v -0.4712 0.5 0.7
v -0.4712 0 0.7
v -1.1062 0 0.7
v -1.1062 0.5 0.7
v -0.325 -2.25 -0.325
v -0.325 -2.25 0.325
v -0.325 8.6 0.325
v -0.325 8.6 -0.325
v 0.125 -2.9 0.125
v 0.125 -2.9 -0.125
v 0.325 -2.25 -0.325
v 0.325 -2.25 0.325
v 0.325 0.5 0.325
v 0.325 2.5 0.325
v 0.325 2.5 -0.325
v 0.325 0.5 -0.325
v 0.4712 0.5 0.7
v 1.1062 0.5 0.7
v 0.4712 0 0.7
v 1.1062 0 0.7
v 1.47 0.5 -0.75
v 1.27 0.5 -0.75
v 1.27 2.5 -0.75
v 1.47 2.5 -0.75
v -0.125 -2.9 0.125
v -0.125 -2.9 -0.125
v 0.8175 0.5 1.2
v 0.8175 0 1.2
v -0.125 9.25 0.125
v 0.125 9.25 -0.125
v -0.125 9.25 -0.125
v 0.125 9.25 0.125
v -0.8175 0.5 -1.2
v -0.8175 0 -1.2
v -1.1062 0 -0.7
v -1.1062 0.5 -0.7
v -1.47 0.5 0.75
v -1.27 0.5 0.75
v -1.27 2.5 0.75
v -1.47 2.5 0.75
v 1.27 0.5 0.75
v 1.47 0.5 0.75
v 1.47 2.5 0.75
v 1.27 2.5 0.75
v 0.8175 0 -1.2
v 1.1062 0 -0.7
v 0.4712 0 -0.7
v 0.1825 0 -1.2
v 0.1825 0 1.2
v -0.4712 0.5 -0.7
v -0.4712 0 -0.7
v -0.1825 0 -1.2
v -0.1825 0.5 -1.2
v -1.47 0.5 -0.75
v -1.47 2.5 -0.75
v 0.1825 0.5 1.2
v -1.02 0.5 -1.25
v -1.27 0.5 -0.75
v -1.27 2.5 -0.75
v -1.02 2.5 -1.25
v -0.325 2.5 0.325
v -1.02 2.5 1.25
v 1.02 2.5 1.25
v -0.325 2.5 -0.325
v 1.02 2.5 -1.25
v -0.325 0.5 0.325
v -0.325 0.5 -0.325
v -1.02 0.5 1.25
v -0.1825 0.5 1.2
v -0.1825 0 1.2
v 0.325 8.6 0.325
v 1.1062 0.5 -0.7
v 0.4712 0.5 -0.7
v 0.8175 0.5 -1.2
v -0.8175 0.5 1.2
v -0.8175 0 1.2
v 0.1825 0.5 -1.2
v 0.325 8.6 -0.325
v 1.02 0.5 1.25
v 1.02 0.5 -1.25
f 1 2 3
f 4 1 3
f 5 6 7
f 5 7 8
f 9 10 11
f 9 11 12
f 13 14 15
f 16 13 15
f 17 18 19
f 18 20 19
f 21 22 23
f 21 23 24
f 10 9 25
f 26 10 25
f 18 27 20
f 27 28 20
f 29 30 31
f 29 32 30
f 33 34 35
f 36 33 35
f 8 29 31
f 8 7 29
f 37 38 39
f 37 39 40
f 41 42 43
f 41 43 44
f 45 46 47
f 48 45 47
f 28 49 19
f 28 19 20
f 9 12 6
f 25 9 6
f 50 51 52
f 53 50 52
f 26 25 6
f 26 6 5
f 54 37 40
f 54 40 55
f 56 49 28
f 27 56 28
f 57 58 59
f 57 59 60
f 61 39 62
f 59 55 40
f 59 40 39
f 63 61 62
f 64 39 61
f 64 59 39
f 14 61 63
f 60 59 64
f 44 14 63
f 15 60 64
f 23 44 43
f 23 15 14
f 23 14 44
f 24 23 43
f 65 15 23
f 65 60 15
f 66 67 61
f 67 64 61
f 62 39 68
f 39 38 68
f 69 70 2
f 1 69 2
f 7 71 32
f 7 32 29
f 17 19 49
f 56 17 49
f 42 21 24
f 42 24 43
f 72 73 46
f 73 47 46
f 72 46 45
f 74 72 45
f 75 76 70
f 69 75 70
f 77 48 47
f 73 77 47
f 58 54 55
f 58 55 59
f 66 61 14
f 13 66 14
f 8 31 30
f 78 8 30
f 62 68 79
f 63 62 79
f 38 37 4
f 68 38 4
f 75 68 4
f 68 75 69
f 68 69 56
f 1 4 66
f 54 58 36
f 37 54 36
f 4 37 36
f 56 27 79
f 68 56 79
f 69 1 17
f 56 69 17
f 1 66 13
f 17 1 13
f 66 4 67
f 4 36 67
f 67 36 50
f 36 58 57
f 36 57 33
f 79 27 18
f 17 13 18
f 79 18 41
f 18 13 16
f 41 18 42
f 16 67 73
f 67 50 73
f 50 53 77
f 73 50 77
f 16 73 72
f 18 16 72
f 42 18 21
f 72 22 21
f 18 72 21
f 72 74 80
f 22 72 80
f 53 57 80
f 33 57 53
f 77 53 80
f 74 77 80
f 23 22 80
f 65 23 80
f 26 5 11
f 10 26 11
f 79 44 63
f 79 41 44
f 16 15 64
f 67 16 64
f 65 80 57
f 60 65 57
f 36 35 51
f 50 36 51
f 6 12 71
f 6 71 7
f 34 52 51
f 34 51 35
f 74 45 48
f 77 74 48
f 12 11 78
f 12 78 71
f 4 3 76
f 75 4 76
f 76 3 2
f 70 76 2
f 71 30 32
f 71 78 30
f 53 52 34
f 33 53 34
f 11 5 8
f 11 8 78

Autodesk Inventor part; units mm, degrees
ref_plane "YZ Plane" through (0, 0, 0) normal (1, 0, 0) x (0, 1, 0)
ref_plane "XZ Plane" through (0, 0, 0) normal (0, 1, 0) x (-1, 0, 0)
ref_plane "XY Plane" through (0, 0, 0) normal (0, 0, 1) x (1, 0, 0)
sketch "Sketch1" plane through (0, 0, 0) normal (0, 1, 0) x (-1, 0, 0)
  line L0 (1.02, 1.25) -> (1.27, 0.75)
  line L1 (-1.02, 1.25) -> (1.02, 1.25)
  line L2 (-1.27, -0.75) -> (-1.27, 0.75)
  line L3 (-1.02, -1.25) -> (-1.27, -0.75)
  line L4 (1.02, -1.25) -> (-1.02, -1.25)
  line L5 (1.27, -0.75) -> (1.02, -1.25)
  line L6 (1.27, 0.75) -> (1.27, -0.75)
  line L7 (1.02, 1.25) -> (1.27, 0.75)
  line L8 (-1.02, 1.25) -> (1.02, 1.25)
  line L9 (-1.27, 0.75) -> (-1.02, 1.25)
  line L10 (0.815, 1.2) -> (0.18, 1.2)
  line L11 (1.1037, 0.7) -> (0.815, 1.2)
  line L12 (0.4687, 0.7) -> (1.1037, 0.7)
  line L13 (0.18, 1.2) -> (0.4687, 0.7)
  line L14 (-0.815, 1.2) -> (-1.1037, 0.7)
  line L15 (-0.18, 1.2) -> (-0.815, 1.2)
  line L16 (-0.4687, 0.7) -> (-0.18, 1.2)
  line L17 (-1.1037, 0.7) -> (-0.4687, 0.7)
  line L18 (0.815, -1.2) -> (1.1037, -0.7)
  line L19 (0.18, -1.2) -> (0.815, -1.2)
  line L20 (0.4687, -0.7) -> (0.18, -1.2)
  line L21 (1.1037, -0.7) -> (0.4687, -0.7)
  line L22 (-0.815, -1.2) -> (-0.18, -1.2)
  line L23 (-1.1037, -0.7) -> (-0.815, -1.2)
  line L24 (-0.4687, -0.7) -> (-1.1037, -0.7)
  line L25 (-0.18, -1.2) -> (-0.4687, -0.7)
  line L26 (-0.325, 0.325) -> (0.325, 0.325)
  line L27 (0.325, 0.325) -> (0.325, -0.325)
  line L28 (-0.325, -0.325) -> (0.325, -0.325)
  line L29 (-0.325, 0.325) -> (-0.325, -0.325)
  point P0 (0, 0)
  point P1 (0, 0)
sketch "Sketch3" plane through (0, 0, 0) normal (0, 1, 0) x (-1, 0, 0)
  line L0 (1.1062, -0.7) -> (0.4712, -0.7)
  line L1 (0.4712, -0.7) -> (0.1825, -1.2)
  line L2 (0.1825, -1.2) -> (0.8175, -1.2)
  line L3 (0.8175, -1.2) -> (1.1062, -0.7)
  line L4 (0.5, -1.2) -> (0.5, -0.7) construction
  point P0 (0, 0)
  dimension "d58" = 120
  dimension "d60" = 0.7
  dimension "d61" = 0.635
  dimension "d62" = 0.5
  dimension "d65" = 0.5
extrude "PCB-Level" add sketch "Sketch3" along normal blind 0.5
mirror "PCB-Level-Mirror1" about plane through (0, 0, 0) normal (1, 0, 0) of "PCB-Level"
mirror "PCB_Level-Mirror2" about plane through (0, 0, 0) normal (0, 0, 1) of "PCB-Level", "PCB-Level-Mirror1"
sketch "Sketch4" plane through (0, 0.5, 0) normal (0, 1, 0) x (1, 0, 0)
  line L0 (-1.02, -1.25) -> (1.02, -1.25)
  line L1 (1.27, -0.75) -> (1.27, 0.75)
  line L2 (1.02, 1.25) -> (-1.02, 1.25)
  line L3 (-1.27, 0.75) -> (-1.27, -0.75)
  line L4 (-1.27, -1.25) -> (1.27, 1.25) construction
  line L5 (1.27, -1.25) -> (-1.27, 1.25) construction
  line L6 (1.27, -0.75) -> (1.02, -1.25)
  line L7 (1.27, 0.75) -> (1.02, 1.25)
  line L8 (-1.27, 0.75) -> (-1.02, 1.25)
  line L9 (-1.27, -0.75) -> (-1.02, -1.25)
  line L10 (-1.02, -1.25) -> (1.02, -1.25)
  line L11 (1.27, 0.75) -> (1.47, 0.75)
  line L12 (1.47, 0.75) -> (1.47, -0.75)
  line L13 (1.47, -0.75) -> (1.27, -0.75)
  line L14 (1.27, -0.75) -> (1.27, 0.75)
  line L15 (-1.27, -0.75) -> (-1.47, -0.75)
  line L16 (-1.47, -0.75) -> (-1.47, 0.75)
  line L17 (-1.47, 0.75) -> (-1.27, 0.75)
  line L18 (-1.27, 0.75) -> (-1.27, -0.75)
  point P0 (0, 0)
  dimension "d68" = 2.54
  dimension "d69" = 2.5
  dimension "d70" = 0.5
  dimension "d71" = 0.25
  dimension "d72" = 0.5
  dimension "d73" = 0.25
  dimension "d74" = 0.5
  dimension "d75" = 0.25
  dimension "d76" = 0.5
  dimension "d77" = 0.25
  dimension "d122" = 0.2
  dimension "d123" = 0.2
sketch "Sketch6" plane through (0, 0, 0) normal (0, 1, 0) x (-1, 0, 0)
  line L0 (0.325, -0.325) -> (-0.325, -0.325) projected
  line L1 (-0.325, -0.325) -> (-0.325, 0.325) projected
  line L2 (-0.325, 0.325) -> (0.325, 0.325) projected
  line L3 (0.325, 0.325) -> (0.325, -0.325) projected
  point P0 (0, 0)
extrude "Pin-Ext" add sketch "Sketch6" along normal blind 9.25 and the other way blind 2.9 separate body
chamfer "Chamfer1" distance 0.2 distance2 0.65 1 edges at (0, 9.25, -0.325) measured on face at (-0.1083, 9.25, -0.1083)
chamfer "Chamfer2" distance 0.2 distance2 0.65 1 edges at (-0.325, 9.25, 0.1) measured on face at (0.1083, 9.25, 0.175)
chamfer "Chamfer3" distance 0.2 distance2 0.65 1 edges at (0.1, 9.25, 0.325) measured on face at (0.175, 9.25, 0.175)
chamfer "Chamfer4" distance 0.2 distance2 0.65 1 edges at (0.325, 9.25, 0) measured on face at (0.175, 9.25, 0.0417)
chamfer "Chamfer5" distance 0.2 distance2 0.65 1 edges at (-0.325, -2.9, 0) measured on face at (-0.1083, -2.9, -0.1083)
chamfer "Chamfer6" distance 0.2 distance2 0.65 1 edges at (0.1, -2.9, 0.325) measured on face at (0.025, -2.9, -0.1083)
chamfer "Chamfer7" distance 0.2 distance2 0.65 1 edges at (0.1, -2.9, -0.325) measured on face at (0.025, -2.9, -0.175)
chamfer "Chamfer8" distance 0.2 distance2 0.65 1 edges at (0.325, -2.9, 0) measured on face at (0.025, -2.9, -0.0417)
extrude "Extrusion9" add sketch "Sketch4" along normal blind 2 bodies 1
sketch "Sketch9" plane through (0, 2.5, 0) normal (0, 1, 0) x (1, 0, 0)
  line L0 (0.325, 0.325) -> (-0.325, 0.325) projected
  line L1 (0.325, -0.325) -> (0.325, 0.325) projected
  line L2 (-0.325, -0.325) -> (0.325, -0.325) projected
  line L3 (-0.325, 0.325) -> (-0.325, -0.325) projected
  point P0 (0, 0)
extrude "Extrusion10" cut sketch "Sketch9" against normal through all bodies 1
equation "\"d74\" = d72"
equation "\"d75\" = d73"
equation "\"d76\" = d72"
equation "\"d77\" = d73"
properties part number "C-Pin"
